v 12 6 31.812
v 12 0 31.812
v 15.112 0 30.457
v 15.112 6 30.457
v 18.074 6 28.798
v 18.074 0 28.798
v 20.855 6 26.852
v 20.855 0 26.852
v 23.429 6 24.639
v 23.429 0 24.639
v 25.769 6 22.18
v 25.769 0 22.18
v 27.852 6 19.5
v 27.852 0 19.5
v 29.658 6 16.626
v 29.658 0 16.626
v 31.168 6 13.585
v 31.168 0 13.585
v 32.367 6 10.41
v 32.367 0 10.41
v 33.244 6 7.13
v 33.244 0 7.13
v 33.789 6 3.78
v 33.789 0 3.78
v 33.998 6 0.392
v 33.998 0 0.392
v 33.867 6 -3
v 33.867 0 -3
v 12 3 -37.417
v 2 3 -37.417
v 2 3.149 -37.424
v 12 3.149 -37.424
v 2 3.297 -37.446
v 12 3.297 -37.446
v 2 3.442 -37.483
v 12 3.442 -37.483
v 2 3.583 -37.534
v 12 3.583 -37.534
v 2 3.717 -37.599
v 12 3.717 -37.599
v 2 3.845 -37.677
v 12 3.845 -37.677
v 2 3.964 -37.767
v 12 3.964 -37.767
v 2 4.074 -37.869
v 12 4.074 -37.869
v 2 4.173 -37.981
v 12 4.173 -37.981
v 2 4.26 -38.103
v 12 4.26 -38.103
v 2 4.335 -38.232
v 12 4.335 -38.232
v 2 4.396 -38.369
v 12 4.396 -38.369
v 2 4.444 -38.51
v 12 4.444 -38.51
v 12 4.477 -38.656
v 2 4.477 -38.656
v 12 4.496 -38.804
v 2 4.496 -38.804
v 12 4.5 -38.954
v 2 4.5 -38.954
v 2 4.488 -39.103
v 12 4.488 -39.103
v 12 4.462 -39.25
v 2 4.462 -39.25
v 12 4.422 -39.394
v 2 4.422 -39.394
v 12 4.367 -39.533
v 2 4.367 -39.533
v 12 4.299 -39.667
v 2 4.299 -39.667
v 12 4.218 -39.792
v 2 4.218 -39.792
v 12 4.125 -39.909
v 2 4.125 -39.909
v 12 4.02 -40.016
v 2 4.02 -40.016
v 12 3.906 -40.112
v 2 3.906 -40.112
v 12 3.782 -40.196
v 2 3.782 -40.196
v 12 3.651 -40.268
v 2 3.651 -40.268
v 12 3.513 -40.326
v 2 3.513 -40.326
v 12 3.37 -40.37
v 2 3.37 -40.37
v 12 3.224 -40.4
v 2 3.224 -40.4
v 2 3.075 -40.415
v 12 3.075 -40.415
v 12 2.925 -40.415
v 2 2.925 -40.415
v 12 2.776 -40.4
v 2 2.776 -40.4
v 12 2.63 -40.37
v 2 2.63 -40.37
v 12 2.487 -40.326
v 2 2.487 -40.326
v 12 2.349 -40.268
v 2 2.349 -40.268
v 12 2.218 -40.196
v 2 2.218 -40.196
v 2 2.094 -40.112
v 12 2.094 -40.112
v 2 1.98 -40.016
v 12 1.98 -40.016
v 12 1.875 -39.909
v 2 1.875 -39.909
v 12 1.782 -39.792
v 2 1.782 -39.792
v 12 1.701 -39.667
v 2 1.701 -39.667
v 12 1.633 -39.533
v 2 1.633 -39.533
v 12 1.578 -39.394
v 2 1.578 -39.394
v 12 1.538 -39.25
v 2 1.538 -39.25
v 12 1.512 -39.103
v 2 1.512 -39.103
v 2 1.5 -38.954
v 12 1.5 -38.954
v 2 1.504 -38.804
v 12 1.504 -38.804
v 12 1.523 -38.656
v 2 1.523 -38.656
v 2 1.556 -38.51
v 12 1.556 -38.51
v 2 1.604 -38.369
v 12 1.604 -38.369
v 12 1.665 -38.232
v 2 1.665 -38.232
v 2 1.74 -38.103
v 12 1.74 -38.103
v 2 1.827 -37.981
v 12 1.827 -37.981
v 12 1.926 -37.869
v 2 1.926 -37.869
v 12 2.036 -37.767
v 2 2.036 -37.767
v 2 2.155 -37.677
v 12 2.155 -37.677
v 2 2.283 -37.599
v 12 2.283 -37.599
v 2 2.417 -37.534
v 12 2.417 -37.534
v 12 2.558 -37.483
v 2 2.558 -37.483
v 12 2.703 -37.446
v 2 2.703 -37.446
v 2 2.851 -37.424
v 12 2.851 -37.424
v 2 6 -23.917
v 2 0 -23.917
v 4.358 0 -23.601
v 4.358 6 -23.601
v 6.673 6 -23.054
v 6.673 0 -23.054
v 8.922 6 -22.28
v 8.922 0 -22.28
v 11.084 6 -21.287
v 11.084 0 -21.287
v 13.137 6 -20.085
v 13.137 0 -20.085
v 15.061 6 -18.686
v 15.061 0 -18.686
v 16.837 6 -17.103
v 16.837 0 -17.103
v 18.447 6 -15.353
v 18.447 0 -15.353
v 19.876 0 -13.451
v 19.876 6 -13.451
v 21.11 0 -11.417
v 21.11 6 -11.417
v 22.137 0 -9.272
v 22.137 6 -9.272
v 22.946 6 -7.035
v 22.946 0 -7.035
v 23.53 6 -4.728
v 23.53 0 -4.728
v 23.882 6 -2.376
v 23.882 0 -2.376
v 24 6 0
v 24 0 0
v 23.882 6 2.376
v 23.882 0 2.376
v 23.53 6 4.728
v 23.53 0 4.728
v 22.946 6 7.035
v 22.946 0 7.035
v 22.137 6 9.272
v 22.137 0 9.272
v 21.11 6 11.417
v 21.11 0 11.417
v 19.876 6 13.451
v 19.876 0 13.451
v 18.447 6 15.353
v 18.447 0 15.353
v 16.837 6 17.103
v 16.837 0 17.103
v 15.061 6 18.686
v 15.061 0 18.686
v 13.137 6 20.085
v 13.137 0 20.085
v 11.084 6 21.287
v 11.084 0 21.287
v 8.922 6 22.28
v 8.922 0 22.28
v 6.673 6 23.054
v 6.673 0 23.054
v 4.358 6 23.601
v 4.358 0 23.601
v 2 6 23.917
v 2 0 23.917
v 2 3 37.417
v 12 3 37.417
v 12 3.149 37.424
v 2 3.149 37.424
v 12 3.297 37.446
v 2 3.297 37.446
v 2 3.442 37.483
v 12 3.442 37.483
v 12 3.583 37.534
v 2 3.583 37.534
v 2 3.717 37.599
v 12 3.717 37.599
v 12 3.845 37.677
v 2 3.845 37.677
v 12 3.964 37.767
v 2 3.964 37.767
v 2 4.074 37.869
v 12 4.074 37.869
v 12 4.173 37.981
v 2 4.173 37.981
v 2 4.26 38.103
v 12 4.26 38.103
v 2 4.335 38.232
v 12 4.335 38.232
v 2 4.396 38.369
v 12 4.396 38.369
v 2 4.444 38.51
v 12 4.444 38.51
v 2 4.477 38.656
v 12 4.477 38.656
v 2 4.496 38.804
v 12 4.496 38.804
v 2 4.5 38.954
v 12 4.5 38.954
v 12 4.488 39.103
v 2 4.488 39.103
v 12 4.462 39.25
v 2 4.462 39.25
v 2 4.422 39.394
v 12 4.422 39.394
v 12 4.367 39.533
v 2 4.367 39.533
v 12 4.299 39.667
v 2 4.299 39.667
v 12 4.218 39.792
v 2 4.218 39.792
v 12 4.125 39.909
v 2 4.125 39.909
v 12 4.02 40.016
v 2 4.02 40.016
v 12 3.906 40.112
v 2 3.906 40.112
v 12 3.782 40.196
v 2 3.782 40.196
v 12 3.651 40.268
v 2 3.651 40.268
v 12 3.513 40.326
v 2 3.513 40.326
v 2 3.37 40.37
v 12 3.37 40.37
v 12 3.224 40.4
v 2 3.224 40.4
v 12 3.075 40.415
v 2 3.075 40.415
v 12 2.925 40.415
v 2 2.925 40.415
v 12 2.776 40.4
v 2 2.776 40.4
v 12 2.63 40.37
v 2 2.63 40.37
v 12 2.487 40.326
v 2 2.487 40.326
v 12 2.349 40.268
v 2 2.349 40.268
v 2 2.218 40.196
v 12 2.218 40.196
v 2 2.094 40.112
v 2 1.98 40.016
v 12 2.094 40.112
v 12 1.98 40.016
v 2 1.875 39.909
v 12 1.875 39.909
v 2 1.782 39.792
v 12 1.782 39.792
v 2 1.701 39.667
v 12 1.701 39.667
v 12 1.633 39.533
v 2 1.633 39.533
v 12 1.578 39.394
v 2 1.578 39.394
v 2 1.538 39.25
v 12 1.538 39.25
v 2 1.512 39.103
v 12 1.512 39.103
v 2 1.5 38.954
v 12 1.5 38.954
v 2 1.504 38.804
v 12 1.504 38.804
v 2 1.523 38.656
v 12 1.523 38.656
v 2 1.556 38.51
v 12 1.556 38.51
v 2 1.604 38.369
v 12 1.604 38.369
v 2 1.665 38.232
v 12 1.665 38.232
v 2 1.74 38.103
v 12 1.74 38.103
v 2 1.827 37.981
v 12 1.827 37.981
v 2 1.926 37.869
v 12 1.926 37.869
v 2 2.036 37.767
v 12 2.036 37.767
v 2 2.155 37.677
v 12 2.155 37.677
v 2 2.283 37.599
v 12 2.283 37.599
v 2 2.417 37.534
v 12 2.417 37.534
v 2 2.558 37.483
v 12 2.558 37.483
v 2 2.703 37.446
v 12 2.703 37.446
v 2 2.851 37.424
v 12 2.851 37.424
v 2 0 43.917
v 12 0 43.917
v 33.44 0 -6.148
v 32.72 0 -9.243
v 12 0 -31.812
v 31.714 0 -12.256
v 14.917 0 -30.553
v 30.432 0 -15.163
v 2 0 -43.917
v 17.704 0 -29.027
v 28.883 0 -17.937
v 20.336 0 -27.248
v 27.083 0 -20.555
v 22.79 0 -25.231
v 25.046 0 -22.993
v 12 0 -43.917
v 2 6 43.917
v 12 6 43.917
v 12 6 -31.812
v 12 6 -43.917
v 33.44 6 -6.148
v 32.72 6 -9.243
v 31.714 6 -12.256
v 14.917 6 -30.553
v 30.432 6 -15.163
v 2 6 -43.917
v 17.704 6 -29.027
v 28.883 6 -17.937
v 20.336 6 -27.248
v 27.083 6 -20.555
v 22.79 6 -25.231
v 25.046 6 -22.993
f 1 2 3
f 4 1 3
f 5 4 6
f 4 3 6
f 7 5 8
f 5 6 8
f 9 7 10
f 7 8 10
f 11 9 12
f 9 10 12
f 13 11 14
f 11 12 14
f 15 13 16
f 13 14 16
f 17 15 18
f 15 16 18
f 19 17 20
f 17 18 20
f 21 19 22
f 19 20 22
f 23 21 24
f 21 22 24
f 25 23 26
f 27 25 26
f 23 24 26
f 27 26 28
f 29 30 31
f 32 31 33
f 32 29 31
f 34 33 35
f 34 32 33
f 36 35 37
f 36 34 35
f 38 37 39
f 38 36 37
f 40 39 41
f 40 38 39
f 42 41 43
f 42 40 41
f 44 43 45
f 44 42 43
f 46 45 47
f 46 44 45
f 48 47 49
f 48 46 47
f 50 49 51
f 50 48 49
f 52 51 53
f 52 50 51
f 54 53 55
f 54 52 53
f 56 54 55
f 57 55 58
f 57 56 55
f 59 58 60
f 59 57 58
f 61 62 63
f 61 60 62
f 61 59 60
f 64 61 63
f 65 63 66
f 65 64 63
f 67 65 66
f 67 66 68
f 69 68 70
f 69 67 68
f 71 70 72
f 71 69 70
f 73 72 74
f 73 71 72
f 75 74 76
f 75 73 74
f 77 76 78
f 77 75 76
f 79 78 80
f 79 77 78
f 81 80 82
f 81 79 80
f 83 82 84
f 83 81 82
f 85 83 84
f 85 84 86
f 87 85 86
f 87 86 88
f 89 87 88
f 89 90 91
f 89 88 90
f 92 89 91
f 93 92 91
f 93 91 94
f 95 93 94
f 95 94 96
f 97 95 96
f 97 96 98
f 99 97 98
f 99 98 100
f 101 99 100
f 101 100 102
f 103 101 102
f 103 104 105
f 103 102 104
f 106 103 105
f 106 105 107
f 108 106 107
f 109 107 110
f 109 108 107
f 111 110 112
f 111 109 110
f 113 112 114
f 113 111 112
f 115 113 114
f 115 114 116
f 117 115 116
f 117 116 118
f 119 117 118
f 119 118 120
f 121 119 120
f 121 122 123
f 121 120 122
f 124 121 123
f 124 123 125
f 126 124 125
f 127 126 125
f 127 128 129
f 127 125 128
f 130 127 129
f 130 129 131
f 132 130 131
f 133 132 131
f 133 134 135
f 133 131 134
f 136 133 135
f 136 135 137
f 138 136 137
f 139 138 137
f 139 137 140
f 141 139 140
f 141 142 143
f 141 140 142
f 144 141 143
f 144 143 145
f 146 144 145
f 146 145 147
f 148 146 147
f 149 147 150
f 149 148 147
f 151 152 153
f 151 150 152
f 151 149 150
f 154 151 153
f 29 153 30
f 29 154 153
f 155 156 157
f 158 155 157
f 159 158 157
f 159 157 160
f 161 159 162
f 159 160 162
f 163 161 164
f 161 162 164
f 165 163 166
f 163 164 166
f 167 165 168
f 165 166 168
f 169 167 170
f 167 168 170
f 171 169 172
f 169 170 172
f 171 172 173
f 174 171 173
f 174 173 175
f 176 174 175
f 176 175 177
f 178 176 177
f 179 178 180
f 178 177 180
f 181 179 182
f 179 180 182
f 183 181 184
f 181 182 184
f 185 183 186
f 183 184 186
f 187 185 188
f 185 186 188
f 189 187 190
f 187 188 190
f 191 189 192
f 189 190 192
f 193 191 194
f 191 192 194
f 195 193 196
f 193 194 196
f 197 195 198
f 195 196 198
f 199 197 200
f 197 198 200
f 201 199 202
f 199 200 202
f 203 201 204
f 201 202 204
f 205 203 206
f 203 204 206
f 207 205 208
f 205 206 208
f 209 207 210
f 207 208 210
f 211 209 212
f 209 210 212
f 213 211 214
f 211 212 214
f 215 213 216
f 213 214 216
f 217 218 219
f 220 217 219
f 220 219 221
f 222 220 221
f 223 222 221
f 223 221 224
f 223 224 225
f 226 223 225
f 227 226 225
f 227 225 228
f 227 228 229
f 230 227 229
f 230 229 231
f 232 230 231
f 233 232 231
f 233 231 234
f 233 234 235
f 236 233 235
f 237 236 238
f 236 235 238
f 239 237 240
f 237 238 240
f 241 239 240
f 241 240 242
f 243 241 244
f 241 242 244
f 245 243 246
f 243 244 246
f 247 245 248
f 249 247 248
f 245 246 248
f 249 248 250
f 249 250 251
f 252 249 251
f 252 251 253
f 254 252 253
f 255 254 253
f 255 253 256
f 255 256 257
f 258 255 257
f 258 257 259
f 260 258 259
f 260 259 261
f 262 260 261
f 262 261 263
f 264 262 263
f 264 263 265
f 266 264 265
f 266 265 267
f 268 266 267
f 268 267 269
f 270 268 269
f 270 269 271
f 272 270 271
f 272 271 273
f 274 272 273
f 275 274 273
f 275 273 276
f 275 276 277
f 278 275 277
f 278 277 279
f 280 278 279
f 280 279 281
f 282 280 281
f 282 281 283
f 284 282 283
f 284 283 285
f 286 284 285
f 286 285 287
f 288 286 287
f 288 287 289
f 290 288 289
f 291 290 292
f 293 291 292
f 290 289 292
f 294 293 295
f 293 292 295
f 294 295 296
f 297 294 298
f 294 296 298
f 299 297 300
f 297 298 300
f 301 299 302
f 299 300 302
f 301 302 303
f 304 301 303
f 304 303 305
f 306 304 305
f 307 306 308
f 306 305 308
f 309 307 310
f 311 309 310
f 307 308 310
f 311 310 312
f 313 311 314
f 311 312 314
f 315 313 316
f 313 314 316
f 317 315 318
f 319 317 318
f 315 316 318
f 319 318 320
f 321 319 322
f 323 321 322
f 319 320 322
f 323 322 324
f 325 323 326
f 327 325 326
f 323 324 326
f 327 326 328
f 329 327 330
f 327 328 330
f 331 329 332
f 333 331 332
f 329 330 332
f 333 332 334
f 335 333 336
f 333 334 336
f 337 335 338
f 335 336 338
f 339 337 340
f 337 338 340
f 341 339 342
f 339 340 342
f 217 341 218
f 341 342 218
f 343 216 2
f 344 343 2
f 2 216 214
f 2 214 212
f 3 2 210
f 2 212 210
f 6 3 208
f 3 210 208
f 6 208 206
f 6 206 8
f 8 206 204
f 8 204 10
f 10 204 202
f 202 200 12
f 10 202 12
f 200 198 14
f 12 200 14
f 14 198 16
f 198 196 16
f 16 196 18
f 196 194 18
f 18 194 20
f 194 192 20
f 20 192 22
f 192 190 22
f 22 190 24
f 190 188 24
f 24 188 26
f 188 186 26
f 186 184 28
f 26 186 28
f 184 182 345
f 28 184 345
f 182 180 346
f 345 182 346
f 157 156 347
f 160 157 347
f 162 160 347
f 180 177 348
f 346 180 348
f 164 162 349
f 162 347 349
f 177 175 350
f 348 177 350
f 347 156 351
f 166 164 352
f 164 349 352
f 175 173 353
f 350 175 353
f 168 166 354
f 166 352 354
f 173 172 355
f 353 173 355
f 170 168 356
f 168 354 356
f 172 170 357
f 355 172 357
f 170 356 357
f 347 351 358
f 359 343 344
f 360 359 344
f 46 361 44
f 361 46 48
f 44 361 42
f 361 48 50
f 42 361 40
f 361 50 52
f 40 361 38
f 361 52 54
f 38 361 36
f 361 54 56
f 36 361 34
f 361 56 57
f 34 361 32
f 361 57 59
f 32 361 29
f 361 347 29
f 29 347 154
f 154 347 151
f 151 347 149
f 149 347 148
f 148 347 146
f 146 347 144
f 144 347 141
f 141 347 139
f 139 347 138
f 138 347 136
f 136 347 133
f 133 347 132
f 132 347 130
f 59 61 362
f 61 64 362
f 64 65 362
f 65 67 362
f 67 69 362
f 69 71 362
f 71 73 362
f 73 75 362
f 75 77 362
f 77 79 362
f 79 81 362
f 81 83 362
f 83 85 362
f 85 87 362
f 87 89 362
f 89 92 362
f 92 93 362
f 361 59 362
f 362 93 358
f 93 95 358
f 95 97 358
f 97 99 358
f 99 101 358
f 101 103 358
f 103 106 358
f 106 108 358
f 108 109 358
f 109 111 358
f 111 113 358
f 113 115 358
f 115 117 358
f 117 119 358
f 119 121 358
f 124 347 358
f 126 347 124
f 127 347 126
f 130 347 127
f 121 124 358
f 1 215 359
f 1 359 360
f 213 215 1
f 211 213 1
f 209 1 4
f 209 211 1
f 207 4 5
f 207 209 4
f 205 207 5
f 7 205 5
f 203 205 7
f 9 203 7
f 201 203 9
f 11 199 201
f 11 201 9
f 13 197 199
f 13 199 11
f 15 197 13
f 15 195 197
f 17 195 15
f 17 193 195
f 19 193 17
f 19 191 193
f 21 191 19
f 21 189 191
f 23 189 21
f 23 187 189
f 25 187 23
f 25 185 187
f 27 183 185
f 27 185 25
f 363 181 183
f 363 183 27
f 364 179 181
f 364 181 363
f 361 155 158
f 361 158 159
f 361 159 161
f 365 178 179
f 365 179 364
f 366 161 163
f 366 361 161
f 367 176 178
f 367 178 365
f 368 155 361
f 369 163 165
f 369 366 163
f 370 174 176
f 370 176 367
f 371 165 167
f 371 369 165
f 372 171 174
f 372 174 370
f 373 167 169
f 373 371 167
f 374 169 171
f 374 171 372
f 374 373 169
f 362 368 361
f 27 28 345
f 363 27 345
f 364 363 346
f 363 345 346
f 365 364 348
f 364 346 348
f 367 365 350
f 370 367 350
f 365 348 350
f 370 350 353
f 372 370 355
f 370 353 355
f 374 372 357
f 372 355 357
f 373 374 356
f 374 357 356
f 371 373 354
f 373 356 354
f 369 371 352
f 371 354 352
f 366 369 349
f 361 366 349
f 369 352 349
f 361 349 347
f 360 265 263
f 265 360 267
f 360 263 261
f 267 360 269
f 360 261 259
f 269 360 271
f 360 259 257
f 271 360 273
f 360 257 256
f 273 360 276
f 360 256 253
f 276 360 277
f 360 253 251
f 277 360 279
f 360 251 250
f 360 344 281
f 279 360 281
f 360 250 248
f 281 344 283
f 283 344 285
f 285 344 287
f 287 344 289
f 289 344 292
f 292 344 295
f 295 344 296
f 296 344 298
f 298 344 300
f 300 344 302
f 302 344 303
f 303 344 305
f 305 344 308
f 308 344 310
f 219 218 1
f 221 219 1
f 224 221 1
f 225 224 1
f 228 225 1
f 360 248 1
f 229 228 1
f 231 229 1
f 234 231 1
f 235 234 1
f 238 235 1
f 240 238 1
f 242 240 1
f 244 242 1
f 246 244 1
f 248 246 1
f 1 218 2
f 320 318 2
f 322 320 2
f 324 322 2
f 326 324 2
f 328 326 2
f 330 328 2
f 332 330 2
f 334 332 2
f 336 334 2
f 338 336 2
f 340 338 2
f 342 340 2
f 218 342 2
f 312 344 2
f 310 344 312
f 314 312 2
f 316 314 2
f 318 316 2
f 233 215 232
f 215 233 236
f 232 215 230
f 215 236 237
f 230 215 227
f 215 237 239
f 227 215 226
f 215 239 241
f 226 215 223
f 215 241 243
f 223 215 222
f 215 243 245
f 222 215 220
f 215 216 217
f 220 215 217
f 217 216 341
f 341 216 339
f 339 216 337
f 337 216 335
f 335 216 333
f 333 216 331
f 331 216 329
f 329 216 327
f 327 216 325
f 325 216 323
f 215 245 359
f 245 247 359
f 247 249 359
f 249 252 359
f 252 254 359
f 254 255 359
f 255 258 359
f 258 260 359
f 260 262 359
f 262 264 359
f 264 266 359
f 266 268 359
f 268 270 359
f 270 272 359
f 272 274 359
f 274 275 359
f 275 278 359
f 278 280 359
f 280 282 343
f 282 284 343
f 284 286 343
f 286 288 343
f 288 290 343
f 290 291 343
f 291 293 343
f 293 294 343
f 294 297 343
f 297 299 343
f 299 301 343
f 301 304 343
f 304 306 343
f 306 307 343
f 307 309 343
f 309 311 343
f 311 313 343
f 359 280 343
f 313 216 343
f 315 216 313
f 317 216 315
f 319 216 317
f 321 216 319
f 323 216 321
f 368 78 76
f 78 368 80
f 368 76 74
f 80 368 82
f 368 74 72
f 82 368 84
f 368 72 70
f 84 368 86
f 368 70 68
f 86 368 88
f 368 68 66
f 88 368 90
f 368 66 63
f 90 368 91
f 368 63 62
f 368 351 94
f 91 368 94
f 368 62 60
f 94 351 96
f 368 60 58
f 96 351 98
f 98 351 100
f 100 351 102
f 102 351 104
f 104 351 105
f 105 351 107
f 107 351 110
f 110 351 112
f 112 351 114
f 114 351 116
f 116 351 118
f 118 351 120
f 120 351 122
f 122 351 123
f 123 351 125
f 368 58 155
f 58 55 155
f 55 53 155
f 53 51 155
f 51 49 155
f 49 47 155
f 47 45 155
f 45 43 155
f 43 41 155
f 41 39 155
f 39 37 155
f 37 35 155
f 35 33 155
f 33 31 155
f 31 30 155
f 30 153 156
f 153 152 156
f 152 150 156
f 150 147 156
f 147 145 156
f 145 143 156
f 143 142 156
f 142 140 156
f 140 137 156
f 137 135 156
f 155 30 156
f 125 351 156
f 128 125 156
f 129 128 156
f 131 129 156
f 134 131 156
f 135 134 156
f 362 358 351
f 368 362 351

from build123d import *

# Parameters (mm, degrees)
BOSS_EXTRUDE1_DEPTH = 6
SKETCH4_R           = 1.5
CUT_EXTRUDE3_DEPTH  = 11


with BuildPart() as part:
    # Sketch1 → Boss-Extrude1 (new body)
    with BuildSketch(Plane(origin=(0, 0, 0), x_dir=(1, 0, 0), z_dir=(0, 1, 0))):
        with BuildLine():
            Line((2, 43.916521486), (2, 23.916521486))
            ThreePointArc((2, 23.916521486), (24, 0), (2, -23.916521486))
            Line((2, -23.916521486), (2, -43.916521486))
            Line((2, -43.916521486), (12, -43.916521486))
            Line((12, -43.916521486), (12, -31.811947441))
            ThreePointArc((12, -31.811947441), (28.791009913, -18.085290934), (33.867388444, 3))
            ThreePointArc((33.867388444, 3), (27.082954224, 20.55513538), (12, 31.811947441))
            Line((12, 31.811947441), (12, 43.916521486))
            Line((12, 43.916521486), (2, 43.916521486))
        make_face()
    extrude(amount=BOSS_EXTRUDE1_DEPTH)

    # Sketch4 → Cut-Extrude3 (cut, through all)
    with BuildSketch(Plane(origin=(12, 0, 0), x_dir=(0, 0, -1), z_dir=(1, 0, 0))):
        with Locations((-38.916521486, 3)):
            Circle(SKETCH4_R)
    cut_extrude3 = extrude(amount=-CUT_EXTRUDE3_DEPTH, mode=Mode.SUBTRACT)

    # Mirror1: Cut-Extrude3 across plane
    add(cut_extrude3.mirror(Plane.XY), mode=Mode.SUBTRACT)


solid = part.part
